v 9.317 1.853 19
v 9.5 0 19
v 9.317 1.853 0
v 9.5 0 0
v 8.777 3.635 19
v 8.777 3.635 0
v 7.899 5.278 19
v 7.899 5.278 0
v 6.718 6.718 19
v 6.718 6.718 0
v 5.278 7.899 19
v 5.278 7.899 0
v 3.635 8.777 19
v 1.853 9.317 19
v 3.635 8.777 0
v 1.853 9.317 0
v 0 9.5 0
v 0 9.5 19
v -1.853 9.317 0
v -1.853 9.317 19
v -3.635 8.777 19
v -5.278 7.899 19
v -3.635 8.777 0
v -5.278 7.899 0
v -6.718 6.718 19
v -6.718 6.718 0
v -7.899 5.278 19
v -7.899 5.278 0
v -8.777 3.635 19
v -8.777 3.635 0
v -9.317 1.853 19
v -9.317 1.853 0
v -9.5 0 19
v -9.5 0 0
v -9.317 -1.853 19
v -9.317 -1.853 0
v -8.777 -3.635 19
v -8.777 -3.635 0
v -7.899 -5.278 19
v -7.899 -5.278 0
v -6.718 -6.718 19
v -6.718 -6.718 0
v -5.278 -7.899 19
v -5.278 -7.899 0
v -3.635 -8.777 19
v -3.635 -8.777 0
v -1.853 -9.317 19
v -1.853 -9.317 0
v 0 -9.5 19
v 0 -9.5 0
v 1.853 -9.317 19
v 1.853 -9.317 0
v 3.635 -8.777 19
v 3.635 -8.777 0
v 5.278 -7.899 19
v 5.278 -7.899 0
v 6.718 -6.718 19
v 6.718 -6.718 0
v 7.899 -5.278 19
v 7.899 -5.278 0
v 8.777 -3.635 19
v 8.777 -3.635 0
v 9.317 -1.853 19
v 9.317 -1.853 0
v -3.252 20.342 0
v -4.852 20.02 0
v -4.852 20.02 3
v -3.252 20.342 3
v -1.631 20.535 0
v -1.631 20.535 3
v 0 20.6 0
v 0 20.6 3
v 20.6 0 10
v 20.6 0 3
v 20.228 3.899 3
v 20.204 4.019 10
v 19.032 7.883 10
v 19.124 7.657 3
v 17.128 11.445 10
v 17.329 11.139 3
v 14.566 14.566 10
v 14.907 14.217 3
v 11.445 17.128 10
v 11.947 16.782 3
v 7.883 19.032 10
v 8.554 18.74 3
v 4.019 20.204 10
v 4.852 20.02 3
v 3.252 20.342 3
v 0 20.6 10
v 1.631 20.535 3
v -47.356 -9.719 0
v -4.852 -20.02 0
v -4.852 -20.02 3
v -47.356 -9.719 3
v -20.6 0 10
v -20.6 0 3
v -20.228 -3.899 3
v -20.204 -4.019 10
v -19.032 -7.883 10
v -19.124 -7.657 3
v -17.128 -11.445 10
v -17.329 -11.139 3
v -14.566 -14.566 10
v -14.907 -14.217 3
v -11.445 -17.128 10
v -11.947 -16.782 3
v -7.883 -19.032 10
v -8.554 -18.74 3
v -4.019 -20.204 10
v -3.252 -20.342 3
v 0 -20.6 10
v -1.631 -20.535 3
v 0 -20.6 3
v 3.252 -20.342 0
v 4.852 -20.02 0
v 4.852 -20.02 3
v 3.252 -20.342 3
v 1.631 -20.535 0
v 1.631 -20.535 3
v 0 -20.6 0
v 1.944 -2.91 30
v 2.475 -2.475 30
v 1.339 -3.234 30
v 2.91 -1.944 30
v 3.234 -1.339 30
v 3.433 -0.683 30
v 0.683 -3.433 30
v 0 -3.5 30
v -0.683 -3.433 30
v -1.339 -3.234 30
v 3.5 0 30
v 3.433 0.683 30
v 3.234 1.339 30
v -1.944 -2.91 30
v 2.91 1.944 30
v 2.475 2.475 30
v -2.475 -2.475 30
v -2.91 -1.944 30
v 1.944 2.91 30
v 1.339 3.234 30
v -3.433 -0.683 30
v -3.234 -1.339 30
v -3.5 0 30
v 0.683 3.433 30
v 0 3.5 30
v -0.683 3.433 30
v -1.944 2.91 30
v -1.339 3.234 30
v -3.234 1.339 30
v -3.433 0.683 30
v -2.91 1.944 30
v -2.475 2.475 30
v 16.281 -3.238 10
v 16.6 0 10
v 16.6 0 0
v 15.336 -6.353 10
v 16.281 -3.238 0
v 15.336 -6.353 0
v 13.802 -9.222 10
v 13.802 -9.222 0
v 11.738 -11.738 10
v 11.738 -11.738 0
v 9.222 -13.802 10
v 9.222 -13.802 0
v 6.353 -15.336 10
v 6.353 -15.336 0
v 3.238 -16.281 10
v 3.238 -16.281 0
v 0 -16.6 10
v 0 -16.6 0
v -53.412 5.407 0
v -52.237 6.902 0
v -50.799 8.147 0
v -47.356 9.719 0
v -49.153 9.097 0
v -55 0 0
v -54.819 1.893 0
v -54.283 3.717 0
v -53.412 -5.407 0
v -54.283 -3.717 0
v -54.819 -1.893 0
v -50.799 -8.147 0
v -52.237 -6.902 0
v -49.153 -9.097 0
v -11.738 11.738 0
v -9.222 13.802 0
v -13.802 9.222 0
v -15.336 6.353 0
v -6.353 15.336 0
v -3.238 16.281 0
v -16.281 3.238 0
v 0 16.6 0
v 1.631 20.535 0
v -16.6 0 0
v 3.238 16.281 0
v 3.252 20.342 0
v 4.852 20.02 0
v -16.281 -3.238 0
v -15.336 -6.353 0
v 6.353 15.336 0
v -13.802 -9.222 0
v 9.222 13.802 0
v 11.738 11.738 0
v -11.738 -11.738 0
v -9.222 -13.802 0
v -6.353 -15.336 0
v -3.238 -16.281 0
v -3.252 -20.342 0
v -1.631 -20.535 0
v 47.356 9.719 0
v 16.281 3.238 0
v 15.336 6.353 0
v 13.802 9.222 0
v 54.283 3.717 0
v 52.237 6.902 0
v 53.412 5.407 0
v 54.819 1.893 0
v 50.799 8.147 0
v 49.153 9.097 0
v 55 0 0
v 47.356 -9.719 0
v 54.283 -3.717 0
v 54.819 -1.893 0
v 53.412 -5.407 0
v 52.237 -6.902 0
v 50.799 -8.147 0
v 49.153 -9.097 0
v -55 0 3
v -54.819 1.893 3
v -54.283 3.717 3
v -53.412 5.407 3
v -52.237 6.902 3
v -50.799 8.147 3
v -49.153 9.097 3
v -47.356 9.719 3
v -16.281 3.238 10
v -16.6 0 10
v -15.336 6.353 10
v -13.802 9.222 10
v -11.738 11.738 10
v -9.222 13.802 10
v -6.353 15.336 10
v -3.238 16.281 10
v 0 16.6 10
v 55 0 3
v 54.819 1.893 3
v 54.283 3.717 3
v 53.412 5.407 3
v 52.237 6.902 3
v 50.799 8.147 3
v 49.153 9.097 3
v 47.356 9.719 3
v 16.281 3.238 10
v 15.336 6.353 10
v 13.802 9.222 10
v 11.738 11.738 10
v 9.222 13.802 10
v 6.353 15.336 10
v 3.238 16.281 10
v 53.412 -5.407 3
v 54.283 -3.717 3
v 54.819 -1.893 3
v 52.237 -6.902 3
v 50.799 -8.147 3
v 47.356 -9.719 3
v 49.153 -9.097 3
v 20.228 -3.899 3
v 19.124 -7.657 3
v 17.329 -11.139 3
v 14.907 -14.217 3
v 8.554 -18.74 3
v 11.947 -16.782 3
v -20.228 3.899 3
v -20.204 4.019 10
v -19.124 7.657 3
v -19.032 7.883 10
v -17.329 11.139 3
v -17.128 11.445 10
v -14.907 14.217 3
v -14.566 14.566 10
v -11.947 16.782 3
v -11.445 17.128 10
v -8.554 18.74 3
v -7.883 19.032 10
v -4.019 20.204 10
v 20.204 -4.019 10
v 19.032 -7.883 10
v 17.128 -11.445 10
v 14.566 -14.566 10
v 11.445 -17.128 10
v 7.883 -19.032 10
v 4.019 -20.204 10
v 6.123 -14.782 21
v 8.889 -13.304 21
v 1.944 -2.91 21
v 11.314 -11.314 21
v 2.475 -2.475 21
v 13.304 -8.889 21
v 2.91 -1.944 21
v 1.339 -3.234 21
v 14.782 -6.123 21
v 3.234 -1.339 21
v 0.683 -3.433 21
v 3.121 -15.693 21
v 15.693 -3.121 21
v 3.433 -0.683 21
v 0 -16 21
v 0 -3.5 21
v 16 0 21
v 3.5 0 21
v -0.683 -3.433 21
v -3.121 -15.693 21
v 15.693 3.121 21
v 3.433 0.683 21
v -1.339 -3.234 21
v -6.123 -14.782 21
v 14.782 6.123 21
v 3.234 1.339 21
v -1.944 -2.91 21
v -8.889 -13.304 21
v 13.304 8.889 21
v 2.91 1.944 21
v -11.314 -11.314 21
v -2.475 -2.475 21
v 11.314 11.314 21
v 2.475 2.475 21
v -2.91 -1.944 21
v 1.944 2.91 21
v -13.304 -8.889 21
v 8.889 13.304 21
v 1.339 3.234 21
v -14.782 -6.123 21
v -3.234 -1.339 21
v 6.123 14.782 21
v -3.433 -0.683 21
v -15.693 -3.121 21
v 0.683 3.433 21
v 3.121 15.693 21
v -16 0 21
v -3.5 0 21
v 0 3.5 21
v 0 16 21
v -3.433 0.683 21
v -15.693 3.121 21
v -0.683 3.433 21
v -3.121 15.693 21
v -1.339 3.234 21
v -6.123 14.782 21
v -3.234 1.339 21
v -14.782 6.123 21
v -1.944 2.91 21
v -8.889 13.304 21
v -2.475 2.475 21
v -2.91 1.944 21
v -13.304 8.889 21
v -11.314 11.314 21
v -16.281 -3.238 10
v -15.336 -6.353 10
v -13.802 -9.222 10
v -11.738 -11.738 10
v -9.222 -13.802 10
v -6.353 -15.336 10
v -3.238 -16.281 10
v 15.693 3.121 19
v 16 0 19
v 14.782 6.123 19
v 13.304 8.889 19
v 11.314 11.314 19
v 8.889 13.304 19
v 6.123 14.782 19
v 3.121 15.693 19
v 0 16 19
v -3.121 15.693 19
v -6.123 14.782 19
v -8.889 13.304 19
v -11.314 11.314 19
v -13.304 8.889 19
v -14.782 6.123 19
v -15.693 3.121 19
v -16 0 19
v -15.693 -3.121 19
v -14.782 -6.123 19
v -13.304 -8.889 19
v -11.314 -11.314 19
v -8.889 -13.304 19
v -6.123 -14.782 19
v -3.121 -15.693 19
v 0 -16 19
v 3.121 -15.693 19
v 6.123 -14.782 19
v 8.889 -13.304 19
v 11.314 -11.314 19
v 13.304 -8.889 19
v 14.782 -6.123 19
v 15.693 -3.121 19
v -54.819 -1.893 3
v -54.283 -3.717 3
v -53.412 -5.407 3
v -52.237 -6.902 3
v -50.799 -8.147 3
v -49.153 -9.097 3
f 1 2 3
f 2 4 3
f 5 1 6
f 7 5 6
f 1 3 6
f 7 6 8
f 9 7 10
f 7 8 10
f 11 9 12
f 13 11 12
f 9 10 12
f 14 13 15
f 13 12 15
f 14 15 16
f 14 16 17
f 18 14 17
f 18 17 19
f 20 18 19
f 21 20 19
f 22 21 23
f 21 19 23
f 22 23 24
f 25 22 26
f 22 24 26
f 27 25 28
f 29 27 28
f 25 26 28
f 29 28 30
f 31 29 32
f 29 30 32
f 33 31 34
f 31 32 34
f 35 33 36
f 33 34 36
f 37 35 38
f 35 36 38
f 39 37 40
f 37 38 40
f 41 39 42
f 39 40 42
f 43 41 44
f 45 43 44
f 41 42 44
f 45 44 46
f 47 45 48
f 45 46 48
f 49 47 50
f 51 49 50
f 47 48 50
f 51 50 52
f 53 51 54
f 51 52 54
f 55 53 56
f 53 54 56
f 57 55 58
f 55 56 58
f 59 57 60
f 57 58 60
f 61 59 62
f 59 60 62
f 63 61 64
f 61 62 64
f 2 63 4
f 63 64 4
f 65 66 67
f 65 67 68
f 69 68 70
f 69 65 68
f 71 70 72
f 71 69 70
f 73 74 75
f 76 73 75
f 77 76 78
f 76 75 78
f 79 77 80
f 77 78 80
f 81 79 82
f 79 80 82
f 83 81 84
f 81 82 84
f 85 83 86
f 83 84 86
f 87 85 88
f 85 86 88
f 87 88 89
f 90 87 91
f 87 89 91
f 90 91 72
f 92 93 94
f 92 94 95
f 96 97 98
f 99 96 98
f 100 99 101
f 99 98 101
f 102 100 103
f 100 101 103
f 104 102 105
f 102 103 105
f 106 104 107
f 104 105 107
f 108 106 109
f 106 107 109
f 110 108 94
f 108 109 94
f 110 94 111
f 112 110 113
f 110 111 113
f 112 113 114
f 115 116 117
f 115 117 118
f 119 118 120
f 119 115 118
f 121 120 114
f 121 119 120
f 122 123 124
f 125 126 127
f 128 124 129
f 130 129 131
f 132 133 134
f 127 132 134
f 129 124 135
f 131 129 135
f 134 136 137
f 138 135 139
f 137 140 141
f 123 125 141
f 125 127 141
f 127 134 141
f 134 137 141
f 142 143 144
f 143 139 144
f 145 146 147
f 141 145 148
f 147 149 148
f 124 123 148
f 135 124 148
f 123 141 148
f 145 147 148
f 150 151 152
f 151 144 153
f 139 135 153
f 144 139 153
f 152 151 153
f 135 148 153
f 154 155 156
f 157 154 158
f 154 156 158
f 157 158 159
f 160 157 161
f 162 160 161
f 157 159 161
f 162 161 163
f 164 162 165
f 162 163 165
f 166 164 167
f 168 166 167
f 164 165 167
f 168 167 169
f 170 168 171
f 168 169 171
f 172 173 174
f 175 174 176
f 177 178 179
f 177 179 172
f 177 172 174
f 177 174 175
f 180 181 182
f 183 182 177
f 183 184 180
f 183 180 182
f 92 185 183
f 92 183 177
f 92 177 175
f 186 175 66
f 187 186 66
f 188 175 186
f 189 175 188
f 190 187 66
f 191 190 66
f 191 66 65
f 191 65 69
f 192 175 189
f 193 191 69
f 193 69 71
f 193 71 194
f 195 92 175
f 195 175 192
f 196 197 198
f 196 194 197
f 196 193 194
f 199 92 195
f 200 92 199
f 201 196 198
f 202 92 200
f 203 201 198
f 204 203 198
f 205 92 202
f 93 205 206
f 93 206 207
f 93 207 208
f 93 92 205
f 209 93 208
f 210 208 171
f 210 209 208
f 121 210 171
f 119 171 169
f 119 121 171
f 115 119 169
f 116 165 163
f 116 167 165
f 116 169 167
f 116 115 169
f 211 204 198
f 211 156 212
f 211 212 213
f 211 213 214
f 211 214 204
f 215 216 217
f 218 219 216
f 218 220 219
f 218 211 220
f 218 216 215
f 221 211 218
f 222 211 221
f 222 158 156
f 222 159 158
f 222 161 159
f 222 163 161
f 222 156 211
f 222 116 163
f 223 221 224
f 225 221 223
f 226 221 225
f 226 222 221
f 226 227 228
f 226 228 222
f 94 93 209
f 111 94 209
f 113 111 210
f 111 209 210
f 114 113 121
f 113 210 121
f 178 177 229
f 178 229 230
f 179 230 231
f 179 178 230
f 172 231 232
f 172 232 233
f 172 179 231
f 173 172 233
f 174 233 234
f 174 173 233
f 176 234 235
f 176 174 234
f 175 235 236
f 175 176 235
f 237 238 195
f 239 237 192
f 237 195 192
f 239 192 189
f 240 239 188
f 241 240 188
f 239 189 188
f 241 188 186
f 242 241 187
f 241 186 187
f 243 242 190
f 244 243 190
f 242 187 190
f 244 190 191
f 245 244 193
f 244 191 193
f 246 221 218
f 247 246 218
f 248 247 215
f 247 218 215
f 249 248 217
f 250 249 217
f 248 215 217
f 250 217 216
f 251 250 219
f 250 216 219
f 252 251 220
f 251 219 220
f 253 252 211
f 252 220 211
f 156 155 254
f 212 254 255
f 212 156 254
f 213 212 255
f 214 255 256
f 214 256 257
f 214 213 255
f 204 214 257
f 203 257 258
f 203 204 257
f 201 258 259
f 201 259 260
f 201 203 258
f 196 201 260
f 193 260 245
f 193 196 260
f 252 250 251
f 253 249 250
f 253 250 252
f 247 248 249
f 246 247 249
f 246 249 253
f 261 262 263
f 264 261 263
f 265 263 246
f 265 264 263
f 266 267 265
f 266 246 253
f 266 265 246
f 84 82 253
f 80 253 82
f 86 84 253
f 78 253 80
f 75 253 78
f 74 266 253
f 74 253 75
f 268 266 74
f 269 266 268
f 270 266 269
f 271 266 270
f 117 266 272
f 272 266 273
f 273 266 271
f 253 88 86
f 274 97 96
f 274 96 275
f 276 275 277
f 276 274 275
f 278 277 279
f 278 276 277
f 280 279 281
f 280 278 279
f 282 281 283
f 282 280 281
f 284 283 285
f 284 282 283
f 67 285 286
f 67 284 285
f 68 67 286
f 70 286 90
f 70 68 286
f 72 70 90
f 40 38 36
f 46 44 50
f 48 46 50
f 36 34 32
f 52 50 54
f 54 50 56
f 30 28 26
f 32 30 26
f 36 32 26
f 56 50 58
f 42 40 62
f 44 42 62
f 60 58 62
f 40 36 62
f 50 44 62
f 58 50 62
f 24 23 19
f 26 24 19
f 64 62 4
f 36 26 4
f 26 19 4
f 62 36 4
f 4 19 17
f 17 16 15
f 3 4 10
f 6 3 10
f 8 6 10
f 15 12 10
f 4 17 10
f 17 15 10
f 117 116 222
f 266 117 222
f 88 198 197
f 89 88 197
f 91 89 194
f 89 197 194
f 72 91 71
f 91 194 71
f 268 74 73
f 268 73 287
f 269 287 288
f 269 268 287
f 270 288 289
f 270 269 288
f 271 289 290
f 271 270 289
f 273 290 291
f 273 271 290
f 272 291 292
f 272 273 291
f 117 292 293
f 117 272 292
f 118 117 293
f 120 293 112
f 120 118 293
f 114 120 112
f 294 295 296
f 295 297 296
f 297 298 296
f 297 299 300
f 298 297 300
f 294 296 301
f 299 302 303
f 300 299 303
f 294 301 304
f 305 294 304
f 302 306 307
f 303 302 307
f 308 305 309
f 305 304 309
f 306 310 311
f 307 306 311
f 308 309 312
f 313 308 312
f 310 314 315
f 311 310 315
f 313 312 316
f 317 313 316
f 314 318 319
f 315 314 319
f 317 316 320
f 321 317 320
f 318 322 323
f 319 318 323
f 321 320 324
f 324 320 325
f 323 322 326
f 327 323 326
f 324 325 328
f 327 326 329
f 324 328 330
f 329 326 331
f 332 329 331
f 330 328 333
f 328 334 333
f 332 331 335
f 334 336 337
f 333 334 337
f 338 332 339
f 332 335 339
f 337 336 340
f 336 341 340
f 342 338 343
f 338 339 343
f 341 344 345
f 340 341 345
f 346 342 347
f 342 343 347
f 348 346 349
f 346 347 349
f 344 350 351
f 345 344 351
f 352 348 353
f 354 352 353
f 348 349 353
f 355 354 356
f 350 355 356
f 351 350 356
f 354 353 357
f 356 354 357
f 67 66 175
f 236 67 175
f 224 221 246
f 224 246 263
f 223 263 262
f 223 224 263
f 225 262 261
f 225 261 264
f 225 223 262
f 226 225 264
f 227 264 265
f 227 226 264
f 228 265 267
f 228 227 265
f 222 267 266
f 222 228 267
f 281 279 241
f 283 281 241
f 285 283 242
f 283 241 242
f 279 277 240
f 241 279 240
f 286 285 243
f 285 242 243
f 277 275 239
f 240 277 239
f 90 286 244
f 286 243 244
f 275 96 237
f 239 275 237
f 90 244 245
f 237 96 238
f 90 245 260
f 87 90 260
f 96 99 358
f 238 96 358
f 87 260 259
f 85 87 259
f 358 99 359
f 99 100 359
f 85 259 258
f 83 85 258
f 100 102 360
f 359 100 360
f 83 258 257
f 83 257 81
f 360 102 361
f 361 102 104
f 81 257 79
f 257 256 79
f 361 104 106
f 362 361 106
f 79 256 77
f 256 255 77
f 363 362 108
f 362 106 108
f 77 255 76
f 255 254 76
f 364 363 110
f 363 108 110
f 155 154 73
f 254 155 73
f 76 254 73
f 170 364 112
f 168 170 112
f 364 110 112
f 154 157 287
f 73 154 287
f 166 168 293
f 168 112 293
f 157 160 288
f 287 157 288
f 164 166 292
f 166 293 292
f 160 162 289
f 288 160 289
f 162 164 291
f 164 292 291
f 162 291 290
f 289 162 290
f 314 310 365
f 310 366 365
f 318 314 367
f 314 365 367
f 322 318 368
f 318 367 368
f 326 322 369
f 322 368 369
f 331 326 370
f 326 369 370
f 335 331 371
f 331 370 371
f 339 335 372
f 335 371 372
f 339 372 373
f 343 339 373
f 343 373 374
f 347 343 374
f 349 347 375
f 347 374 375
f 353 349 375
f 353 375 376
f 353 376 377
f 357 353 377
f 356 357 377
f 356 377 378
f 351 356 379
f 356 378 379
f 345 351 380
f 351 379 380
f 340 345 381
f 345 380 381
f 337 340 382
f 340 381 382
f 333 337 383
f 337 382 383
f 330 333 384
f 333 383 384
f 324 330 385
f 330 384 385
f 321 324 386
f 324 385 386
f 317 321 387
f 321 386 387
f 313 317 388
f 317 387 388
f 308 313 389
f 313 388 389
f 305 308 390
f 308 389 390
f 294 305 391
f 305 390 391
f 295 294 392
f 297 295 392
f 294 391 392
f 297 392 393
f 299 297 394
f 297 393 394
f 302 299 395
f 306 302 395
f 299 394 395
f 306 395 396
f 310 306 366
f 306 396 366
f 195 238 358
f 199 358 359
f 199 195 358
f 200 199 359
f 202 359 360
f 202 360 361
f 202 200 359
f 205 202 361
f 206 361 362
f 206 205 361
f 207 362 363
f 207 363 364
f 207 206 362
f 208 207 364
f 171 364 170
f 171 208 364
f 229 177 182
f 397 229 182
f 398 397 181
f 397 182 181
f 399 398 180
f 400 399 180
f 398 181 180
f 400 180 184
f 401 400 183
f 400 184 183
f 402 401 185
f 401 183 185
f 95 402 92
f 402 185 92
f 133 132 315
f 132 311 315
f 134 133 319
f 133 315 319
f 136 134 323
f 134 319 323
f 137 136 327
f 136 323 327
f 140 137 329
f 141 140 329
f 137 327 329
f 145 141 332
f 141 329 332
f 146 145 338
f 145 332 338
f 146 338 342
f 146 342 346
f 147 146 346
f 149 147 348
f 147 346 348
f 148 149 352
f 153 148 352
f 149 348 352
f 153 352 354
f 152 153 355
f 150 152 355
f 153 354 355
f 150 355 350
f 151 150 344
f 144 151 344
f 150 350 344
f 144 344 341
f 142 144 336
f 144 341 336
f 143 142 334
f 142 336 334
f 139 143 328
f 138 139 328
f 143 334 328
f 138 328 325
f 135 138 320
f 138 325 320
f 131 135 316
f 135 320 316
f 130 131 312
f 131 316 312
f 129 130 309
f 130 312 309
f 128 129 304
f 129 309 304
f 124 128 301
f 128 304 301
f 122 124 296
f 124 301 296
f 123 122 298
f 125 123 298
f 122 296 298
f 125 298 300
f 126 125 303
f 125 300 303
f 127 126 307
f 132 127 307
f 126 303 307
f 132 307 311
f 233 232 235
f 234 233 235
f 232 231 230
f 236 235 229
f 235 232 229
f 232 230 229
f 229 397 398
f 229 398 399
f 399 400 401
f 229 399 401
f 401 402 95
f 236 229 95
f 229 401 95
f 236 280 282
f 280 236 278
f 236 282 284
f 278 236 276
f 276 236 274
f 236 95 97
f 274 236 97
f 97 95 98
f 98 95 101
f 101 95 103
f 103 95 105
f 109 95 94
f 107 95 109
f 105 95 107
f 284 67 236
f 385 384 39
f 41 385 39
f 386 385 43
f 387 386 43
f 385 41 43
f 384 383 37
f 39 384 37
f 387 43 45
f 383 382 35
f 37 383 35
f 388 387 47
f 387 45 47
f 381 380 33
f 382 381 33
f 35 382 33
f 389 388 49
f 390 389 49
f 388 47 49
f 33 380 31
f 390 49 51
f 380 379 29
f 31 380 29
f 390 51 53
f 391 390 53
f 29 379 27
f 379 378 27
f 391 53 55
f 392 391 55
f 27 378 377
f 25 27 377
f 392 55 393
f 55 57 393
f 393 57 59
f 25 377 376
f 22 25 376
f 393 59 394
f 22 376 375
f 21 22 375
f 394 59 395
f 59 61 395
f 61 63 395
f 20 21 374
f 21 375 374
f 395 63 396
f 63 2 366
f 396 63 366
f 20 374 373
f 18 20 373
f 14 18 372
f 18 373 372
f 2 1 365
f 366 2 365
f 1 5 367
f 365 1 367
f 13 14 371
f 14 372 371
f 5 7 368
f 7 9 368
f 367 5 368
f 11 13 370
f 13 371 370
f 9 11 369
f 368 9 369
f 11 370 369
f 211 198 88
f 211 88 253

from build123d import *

# Parameters (mm, degrees)
PAD_DEPTH               = 3
PAD001_DEPTH            = 10
PAD_MIRRORED_2_DEPTH    = 3
PAD001_MIRRORED_2_DEPTH = 10


with BuildPart() as body:
    # Sketch → Pad (new body)
    with BuildSketch(Plane.XY):
        with BuildLine():
            Line((0, 16.6), (0, 20.6))
            ThreePointArc((4.852487, 20.020324), (2.443494, 20.454568), (0, 20.6))
            Line((4.852487, 20.020324), (47.355549, 9.71861))
            ThreePointArc((55, 0), (52.859882, 6.182415), (47.355549, 9.71861))
            Line((16.6, 0), (55, 0))
            ThreePointArc((16.6, 0), (11.737973, 11.737973), (0, 16.6))
        make_face()
    pad = extrude(amount=PAD_DEPTH)

    # Sketch001 → Pad001 (join)
    with BuildSketch(Plane.XY):
        with BuildLine():
            ThreePointArc((16.6, 0), (11.737973, 11.737973), (0, 16.6))
            Line((0, 16.6), (0, 20.6))
            ThreePointArc((20.6, 0), (14.5664, 14.5664), (0, 20.6))
            Line((16.6, 0), (20.6, 0))
        make_face()
    pad001 = extrude(amount=PAD001_DEPTH)

    # Sketch Mirrored 2 → Pad Mirrored 2 (add)
    with BuildSketch(Plane(origin=(0, 0, 0), x_dir=(-1, 0, 0), z_dir=(0, 0, -1))):
        with BuildLine():
            Line((0, 16.6), (0, 20.6))
            ThreePointArc((4.852487, 20.020324), (2.443494, 20.454568), (0, 20.6))
            Line((4.852487, 20.020324), (47.355549, 9.71861))
            ThreePointArc((55, 0), (52.859882, 6.182415), (47.355549, 9.71861))
            Line((16.6, 0), (55, 0))
            ThreePointArc((16.6, 0), (11.737973, 11.737973), (0, 16.6))
        make_face()
    pad_mirrored_2 = extrude(amount=-PAD_MIRRORED_2_DEPTH)

    # Sketch001 Mirrored 2 → Pad001 Mirrored 2 (add)
    with BuildSketch(Plane(origin=(0, 0, 0), x_dir=(-1, 0, 0), z_dir=(0, 0, -1))):
        with BuildLine():
            ThreePointArc((16.6, 0), (11.737973, 11.737973), (0, 16.6))
            Line((0, 16.6), (0, 20.6))
            ThreePointArc((20.6, 0), (14.5664, 14.5664), (0, 20.6))
            Line((16.6, 0), (20.6, 0))
        make_face()
    pad001_mirrored_2 = extrude(amount=-PAD001_MIRRORED_2_DEPTH)

    # Mirrored001: Pad, Pad001, Pad Mirrored 2, Pad001 Mirrored 2 across Sketch H_Axis
    add(pad.mirror(Plane.ZX))
    add(pad001.mirror(Plane.ZX))
    add(pad_mirrored_2.mirror(Plane.ZX))
    add(pad001_mirrored_2.mirror(Plane.ZX))


with BuildPart() as body001:
    # Sketch002 → Revolution (revolve)
    with BuildSketch(Plane.XZ):
        Polygon((0, 30), (3.5, 30), (3.5, 21), (16, 21), (16, 19), (9.5, 19), (9.5, 0), (0, 0), align=None)
    revolve(axis=Axis((0, 0, 0), (0, 0, 1)))


solid = Compound([body.part, body001.part])
